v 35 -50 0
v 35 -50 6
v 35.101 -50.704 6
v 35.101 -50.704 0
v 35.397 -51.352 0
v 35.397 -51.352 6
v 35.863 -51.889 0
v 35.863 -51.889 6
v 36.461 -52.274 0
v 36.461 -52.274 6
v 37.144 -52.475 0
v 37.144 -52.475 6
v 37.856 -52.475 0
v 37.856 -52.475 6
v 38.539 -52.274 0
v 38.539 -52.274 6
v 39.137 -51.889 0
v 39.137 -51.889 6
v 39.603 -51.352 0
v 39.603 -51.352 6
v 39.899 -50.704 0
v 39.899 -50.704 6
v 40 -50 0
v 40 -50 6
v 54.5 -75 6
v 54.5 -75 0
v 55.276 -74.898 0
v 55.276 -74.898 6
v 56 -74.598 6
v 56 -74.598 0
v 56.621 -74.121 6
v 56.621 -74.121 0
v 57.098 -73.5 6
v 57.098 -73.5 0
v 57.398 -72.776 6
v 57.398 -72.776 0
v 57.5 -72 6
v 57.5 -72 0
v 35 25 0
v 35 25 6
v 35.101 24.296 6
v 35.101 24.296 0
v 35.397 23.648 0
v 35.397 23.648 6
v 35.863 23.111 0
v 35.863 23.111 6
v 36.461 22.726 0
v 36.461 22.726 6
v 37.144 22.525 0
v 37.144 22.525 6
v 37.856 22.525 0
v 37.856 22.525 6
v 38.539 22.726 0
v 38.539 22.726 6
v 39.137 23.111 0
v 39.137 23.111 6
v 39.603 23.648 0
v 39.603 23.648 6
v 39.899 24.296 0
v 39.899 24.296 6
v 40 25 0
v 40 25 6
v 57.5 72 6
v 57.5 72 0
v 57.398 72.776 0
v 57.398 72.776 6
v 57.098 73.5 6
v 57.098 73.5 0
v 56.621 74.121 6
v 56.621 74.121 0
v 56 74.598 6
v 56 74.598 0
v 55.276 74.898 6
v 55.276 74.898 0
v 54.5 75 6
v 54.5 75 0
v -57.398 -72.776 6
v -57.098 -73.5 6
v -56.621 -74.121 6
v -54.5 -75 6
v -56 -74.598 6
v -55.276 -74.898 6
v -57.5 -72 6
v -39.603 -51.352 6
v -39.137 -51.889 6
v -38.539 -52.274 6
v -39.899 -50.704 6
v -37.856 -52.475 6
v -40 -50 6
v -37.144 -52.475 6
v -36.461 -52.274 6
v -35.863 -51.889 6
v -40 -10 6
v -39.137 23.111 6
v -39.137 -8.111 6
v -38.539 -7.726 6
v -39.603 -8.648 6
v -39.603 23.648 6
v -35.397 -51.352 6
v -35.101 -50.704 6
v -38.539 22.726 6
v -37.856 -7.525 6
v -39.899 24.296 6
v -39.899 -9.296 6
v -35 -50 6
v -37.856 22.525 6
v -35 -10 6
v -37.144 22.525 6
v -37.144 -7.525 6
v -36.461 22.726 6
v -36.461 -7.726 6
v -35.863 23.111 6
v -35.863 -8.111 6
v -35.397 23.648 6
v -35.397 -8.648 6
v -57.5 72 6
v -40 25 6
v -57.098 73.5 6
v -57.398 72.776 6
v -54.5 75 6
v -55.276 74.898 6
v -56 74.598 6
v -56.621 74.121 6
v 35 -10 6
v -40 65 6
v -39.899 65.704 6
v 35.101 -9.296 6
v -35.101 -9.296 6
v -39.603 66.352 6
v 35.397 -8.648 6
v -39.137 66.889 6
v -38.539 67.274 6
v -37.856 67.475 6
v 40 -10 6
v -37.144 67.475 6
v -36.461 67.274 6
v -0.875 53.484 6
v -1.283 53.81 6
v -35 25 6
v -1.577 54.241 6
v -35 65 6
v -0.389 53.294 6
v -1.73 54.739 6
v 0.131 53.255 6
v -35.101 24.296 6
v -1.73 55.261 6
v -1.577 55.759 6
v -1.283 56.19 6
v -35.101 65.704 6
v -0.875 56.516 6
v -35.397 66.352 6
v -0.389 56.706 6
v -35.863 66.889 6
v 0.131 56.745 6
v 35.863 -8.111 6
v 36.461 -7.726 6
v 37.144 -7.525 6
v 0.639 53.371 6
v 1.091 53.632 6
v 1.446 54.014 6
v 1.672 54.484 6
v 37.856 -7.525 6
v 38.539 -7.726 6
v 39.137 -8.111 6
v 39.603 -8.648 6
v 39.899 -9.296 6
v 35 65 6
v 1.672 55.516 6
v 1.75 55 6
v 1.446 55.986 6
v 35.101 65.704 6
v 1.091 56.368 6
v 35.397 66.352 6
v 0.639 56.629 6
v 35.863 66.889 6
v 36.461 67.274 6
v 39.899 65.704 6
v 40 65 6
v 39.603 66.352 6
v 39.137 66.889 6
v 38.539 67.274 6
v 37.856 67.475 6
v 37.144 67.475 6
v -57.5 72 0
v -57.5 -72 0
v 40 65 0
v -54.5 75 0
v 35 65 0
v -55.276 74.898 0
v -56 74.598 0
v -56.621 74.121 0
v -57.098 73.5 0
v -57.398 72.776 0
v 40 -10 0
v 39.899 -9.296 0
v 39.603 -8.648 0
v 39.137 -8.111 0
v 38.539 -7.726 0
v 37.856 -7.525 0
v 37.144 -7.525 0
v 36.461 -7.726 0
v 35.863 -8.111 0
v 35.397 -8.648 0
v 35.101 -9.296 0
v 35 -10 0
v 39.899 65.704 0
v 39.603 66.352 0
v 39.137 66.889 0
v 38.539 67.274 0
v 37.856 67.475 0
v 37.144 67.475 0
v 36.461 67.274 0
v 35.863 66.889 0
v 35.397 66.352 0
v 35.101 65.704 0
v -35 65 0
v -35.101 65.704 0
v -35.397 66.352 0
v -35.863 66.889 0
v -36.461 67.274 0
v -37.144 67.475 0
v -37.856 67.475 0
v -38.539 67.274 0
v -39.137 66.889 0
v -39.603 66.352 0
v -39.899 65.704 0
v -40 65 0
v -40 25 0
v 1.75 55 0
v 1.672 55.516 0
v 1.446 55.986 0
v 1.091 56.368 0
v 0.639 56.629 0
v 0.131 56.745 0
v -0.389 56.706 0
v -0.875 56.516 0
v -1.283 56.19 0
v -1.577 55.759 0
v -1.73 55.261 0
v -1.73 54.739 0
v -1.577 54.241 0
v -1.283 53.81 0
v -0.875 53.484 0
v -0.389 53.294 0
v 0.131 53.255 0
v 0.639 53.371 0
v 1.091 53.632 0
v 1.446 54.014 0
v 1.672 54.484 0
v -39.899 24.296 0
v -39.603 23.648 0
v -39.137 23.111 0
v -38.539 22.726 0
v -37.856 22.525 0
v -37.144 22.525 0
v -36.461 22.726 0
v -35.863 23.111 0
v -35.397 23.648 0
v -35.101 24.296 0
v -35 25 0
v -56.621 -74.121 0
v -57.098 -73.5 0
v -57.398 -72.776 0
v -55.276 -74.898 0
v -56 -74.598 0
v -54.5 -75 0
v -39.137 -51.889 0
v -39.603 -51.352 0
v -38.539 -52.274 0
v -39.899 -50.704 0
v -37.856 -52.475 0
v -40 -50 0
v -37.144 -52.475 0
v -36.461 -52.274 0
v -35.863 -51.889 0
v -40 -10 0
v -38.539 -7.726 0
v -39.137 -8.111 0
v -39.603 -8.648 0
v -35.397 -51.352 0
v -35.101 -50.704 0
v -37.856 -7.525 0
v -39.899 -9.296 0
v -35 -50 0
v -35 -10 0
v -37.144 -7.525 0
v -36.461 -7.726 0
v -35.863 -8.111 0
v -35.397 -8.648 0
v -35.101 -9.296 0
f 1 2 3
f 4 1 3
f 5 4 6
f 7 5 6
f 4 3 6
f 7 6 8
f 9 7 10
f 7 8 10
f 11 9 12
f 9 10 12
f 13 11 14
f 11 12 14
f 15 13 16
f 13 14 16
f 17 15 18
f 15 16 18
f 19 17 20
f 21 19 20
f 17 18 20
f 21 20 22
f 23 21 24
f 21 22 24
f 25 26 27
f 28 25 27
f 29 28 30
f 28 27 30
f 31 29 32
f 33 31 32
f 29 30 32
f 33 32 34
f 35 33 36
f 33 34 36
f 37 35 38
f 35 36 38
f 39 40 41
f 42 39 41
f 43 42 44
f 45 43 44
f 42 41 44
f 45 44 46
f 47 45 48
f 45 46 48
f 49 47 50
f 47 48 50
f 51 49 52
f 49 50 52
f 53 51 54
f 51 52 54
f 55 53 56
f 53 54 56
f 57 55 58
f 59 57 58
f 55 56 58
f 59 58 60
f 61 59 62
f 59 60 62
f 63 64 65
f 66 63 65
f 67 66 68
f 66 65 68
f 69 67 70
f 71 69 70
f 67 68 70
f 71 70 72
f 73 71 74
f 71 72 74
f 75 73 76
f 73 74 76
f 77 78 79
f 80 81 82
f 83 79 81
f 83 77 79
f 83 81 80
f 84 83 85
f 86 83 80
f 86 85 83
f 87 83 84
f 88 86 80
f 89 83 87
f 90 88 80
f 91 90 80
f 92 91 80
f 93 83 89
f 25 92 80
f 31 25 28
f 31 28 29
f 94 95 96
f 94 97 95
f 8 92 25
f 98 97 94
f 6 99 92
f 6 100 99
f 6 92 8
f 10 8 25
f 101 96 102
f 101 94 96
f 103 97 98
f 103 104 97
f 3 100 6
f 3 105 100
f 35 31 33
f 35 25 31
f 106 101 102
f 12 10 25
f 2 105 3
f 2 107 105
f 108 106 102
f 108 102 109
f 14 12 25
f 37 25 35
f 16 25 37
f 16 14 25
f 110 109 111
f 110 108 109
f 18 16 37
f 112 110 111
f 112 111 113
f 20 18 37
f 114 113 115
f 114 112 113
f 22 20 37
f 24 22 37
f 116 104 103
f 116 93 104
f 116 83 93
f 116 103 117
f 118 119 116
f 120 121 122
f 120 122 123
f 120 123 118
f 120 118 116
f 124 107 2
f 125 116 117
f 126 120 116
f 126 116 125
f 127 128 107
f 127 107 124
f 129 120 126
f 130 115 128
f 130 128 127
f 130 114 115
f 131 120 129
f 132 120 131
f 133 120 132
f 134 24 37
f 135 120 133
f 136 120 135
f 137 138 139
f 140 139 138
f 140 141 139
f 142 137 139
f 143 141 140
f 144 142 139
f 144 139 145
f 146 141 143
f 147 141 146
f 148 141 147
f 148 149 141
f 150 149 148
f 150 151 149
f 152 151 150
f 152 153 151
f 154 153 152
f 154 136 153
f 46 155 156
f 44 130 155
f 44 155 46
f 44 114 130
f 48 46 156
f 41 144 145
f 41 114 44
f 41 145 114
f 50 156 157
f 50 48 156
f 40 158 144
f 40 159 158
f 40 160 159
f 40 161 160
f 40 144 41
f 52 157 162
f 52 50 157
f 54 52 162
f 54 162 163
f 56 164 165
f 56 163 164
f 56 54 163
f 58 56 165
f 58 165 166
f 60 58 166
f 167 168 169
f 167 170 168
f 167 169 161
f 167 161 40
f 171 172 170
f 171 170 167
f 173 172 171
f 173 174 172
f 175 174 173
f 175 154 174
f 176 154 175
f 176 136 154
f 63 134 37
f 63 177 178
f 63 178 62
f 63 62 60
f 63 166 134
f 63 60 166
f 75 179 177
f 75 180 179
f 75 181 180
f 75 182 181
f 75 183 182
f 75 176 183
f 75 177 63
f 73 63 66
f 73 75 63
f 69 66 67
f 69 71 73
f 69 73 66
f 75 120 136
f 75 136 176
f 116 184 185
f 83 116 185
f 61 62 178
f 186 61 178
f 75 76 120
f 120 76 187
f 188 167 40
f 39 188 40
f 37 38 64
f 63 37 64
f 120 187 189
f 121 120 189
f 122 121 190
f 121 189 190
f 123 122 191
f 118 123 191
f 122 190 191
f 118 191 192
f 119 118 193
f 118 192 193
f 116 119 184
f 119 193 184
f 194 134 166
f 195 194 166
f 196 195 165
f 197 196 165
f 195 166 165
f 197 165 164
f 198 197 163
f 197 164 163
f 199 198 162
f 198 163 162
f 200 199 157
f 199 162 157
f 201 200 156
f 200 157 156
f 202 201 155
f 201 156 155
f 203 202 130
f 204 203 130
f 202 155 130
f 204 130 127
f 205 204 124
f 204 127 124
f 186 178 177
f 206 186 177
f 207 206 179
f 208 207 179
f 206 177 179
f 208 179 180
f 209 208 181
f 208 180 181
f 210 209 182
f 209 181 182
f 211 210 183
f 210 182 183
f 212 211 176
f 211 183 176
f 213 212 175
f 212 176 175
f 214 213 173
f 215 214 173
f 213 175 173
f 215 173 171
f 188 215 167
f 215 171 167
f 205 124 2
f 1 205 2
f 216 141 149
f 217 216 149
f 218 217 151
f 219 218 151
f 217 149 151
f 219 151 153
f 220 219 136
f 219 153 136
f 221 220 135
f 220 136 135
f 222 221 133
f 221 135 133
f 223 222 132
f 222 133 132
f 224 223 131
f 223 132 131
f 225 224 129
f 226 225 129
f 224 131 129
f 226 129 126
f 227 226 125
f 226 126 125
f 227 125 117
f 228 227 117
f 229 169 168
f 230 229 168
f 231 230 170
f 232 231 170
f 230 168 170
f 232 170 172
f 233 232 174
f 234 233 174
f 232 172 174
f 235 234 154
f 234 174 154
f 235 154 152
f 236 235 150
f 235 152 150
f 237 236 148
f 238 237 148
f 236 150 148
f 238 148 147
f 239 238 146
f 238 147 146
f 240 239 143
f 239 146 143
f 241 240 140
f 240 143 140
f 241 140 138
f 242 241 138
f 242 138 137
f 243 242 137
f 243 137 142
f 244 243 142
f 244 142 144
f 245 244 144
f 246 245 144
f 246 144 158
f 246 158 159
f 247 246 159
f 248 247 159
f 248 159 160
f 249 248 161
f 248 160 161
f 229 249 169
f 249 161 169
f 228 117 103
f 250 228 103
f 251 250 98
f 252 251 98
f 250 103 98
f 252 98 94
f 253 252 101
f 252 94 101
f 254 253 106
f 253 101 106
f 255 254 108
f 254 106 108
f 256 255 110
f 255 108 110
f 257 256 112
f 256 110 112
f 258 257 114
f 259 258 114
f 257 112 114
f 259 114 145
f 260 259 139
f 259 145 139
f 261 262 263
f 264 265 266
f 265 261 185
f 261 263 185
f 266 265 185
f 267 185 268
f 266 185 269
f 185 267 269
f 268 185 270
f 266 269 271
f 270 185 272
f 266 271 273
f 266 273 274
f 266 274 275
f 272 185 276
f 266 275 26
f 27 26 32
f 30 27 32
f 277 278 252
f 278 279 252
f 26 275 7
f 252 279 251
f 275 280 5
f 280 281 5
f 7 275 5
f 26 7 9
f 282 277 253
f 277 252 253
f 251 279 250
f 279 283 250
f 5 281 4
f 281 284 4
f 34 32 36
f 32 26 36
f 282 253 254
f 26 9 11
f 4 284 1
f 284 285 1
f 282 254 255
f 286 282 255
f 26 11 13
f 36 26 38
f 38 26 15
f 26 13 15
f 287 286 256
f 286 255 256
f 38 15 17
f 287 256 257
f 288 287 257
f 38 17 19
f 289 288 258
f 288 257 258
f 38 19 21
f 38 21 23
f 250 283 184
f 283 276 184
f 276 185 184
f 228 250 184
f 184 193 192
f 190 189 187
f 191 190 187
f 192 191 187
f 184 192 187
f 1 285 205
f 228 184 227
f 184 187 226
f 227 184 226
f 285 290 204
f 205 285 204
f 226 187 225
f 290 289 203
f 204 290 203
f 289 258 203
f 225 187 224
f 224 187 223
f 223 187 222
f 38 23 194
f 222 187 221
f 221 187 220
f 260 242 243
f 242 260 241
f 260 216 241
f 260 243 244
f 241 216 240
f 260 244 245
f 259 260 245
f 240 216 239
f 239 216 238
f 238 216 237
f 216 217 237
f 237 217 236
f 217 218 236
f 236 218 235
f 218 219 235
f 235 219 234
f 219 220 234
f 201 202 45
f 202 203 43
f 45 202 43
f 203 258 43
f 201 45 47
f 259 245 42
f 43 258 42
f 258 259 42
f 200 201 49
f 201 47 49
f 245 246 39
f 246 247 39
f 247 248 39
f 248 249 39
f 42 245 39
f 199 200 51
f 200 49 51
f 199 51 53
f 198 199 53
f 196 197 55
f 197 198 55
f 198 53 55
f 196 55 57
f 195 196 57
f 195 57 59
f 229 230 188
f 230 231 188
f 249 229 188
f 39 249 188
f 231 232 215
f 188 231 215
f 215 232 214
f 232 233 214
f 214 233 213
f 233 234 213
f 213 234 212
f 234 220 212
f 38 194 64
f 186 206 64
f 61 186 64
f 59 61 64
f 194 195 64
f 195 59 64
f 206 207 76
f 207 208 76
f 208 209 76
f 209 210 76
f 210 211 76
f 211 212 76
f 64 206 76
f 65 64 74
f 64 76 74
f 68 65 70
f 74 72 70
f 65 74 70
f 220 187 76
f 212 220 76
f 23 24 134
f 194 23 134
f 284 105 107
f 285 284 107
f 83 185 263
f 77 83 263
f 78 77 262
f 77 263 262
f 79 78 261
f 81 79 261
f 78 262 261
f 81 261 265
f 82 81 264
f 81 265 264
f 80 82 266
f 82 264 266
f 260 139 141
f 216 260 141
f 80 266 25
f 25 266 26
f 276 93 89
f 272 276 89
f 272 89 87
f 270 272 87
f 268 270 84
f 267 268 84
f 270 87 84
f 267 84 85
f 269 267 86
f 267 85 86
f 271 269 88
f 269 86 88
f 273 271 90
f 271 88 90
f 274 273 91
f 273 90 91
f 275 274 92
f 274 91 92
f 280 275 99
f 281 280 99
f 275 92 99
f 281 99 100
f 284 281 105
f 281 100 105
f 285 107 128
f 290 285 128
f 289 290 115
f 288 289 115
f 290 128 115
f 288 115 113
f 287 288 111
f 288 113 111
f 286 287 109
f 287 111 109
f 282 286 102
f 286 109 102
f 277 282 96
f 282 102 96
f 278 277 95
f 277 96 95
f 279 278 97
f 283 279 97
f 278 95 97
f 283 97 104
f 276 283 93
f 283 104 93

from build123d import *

# Parameters (mm, degrees)
F1_DEPTH = 6
F3_DEPTH = 6
F4_R     = 1.75
F5_DEPTH = 6


with BuildPart() as f1:
    # F0 (on Top) → F1 (new body)
    with BuildSketch(Plane.XY):
        with BuildLine():
            Line((-54.5, -75), (54.5, -75))
            ThreePointArc((54.5, -75), (56.62132, -74.12132), (57.5, -72))
            Line((57.5, -72), (57.5, 72))
            ThreePointArc((57.5, 72), (56.62132, 74.12132), (54.5, 75))
            Line((54.5, 75), (-54.5, 75))
            ThreePointArc((-54.5, 75), (-56.62132, 74.12132), (-57.5, 72))
            Line((-57.5, 72), (-57.5, -72))
            ThreePointArc((-57.5, -72), (-56.62132, -74.12132), (-54.5, -75))
        make_face()
    extrude(amount=F1_DEPTH)

    # F2 (on face) → F3 (cut, through all)
    with BuildSketch(Plane.XY.offset(6)):
        with BuildLine():
            ThreePointArc((-35, 65), (-37.5, 67.5), (-40, 65))
            Line((-40, 65), (-40, 25))
            ThreePointArc((-40, 25), (-37.5, 22.5), (-35, 25))
            Line((-35, 25), (-35, 65))
        make_face()
        with BuildLine():
            ThreePointArc((40, 65), (37.5, 67.5), (35, 65))
            Line((35, 65), (35, 25))
            ThreePointArc((35, 25), (37.5, 22.5), (40, 25))
            Line((40, 25), (40, 65))
        make_face()
        with BuildLine():
            ThreePointArc((40, -10), (37.5, -7.5), (35, -10))
            Line((35, -10), (35, -50))
            ThreePointArc((35, -50), (37.5, -52.5), (40, -50))
            Line((40, -50), (40, -10))
        make_face()
        with BuildLine():
            ThreePointArc((-35, -10), (-37.5, -7.5), (-40, -10))
            Line((-40, -10), (-40, -50))
            ThreePointArc((-40, -50), (-37.5, -52.5), (-35, -50))
            Line((-35, -50), (-35, -10))
        make_face()
    extrude(amount=-F3_DEPTH, mode=Mode.SUBTRACT)

    # F4 (on face) → F5 (cut, through all)
    with BuildSketch(Plane.XY.offset(6)):
        with Locations((0, 55)):
            Circle(F4_R)
    extrude(amount=-F5_DEPTH, mode=Mode.SUBTRACT)


solid = f1.part
